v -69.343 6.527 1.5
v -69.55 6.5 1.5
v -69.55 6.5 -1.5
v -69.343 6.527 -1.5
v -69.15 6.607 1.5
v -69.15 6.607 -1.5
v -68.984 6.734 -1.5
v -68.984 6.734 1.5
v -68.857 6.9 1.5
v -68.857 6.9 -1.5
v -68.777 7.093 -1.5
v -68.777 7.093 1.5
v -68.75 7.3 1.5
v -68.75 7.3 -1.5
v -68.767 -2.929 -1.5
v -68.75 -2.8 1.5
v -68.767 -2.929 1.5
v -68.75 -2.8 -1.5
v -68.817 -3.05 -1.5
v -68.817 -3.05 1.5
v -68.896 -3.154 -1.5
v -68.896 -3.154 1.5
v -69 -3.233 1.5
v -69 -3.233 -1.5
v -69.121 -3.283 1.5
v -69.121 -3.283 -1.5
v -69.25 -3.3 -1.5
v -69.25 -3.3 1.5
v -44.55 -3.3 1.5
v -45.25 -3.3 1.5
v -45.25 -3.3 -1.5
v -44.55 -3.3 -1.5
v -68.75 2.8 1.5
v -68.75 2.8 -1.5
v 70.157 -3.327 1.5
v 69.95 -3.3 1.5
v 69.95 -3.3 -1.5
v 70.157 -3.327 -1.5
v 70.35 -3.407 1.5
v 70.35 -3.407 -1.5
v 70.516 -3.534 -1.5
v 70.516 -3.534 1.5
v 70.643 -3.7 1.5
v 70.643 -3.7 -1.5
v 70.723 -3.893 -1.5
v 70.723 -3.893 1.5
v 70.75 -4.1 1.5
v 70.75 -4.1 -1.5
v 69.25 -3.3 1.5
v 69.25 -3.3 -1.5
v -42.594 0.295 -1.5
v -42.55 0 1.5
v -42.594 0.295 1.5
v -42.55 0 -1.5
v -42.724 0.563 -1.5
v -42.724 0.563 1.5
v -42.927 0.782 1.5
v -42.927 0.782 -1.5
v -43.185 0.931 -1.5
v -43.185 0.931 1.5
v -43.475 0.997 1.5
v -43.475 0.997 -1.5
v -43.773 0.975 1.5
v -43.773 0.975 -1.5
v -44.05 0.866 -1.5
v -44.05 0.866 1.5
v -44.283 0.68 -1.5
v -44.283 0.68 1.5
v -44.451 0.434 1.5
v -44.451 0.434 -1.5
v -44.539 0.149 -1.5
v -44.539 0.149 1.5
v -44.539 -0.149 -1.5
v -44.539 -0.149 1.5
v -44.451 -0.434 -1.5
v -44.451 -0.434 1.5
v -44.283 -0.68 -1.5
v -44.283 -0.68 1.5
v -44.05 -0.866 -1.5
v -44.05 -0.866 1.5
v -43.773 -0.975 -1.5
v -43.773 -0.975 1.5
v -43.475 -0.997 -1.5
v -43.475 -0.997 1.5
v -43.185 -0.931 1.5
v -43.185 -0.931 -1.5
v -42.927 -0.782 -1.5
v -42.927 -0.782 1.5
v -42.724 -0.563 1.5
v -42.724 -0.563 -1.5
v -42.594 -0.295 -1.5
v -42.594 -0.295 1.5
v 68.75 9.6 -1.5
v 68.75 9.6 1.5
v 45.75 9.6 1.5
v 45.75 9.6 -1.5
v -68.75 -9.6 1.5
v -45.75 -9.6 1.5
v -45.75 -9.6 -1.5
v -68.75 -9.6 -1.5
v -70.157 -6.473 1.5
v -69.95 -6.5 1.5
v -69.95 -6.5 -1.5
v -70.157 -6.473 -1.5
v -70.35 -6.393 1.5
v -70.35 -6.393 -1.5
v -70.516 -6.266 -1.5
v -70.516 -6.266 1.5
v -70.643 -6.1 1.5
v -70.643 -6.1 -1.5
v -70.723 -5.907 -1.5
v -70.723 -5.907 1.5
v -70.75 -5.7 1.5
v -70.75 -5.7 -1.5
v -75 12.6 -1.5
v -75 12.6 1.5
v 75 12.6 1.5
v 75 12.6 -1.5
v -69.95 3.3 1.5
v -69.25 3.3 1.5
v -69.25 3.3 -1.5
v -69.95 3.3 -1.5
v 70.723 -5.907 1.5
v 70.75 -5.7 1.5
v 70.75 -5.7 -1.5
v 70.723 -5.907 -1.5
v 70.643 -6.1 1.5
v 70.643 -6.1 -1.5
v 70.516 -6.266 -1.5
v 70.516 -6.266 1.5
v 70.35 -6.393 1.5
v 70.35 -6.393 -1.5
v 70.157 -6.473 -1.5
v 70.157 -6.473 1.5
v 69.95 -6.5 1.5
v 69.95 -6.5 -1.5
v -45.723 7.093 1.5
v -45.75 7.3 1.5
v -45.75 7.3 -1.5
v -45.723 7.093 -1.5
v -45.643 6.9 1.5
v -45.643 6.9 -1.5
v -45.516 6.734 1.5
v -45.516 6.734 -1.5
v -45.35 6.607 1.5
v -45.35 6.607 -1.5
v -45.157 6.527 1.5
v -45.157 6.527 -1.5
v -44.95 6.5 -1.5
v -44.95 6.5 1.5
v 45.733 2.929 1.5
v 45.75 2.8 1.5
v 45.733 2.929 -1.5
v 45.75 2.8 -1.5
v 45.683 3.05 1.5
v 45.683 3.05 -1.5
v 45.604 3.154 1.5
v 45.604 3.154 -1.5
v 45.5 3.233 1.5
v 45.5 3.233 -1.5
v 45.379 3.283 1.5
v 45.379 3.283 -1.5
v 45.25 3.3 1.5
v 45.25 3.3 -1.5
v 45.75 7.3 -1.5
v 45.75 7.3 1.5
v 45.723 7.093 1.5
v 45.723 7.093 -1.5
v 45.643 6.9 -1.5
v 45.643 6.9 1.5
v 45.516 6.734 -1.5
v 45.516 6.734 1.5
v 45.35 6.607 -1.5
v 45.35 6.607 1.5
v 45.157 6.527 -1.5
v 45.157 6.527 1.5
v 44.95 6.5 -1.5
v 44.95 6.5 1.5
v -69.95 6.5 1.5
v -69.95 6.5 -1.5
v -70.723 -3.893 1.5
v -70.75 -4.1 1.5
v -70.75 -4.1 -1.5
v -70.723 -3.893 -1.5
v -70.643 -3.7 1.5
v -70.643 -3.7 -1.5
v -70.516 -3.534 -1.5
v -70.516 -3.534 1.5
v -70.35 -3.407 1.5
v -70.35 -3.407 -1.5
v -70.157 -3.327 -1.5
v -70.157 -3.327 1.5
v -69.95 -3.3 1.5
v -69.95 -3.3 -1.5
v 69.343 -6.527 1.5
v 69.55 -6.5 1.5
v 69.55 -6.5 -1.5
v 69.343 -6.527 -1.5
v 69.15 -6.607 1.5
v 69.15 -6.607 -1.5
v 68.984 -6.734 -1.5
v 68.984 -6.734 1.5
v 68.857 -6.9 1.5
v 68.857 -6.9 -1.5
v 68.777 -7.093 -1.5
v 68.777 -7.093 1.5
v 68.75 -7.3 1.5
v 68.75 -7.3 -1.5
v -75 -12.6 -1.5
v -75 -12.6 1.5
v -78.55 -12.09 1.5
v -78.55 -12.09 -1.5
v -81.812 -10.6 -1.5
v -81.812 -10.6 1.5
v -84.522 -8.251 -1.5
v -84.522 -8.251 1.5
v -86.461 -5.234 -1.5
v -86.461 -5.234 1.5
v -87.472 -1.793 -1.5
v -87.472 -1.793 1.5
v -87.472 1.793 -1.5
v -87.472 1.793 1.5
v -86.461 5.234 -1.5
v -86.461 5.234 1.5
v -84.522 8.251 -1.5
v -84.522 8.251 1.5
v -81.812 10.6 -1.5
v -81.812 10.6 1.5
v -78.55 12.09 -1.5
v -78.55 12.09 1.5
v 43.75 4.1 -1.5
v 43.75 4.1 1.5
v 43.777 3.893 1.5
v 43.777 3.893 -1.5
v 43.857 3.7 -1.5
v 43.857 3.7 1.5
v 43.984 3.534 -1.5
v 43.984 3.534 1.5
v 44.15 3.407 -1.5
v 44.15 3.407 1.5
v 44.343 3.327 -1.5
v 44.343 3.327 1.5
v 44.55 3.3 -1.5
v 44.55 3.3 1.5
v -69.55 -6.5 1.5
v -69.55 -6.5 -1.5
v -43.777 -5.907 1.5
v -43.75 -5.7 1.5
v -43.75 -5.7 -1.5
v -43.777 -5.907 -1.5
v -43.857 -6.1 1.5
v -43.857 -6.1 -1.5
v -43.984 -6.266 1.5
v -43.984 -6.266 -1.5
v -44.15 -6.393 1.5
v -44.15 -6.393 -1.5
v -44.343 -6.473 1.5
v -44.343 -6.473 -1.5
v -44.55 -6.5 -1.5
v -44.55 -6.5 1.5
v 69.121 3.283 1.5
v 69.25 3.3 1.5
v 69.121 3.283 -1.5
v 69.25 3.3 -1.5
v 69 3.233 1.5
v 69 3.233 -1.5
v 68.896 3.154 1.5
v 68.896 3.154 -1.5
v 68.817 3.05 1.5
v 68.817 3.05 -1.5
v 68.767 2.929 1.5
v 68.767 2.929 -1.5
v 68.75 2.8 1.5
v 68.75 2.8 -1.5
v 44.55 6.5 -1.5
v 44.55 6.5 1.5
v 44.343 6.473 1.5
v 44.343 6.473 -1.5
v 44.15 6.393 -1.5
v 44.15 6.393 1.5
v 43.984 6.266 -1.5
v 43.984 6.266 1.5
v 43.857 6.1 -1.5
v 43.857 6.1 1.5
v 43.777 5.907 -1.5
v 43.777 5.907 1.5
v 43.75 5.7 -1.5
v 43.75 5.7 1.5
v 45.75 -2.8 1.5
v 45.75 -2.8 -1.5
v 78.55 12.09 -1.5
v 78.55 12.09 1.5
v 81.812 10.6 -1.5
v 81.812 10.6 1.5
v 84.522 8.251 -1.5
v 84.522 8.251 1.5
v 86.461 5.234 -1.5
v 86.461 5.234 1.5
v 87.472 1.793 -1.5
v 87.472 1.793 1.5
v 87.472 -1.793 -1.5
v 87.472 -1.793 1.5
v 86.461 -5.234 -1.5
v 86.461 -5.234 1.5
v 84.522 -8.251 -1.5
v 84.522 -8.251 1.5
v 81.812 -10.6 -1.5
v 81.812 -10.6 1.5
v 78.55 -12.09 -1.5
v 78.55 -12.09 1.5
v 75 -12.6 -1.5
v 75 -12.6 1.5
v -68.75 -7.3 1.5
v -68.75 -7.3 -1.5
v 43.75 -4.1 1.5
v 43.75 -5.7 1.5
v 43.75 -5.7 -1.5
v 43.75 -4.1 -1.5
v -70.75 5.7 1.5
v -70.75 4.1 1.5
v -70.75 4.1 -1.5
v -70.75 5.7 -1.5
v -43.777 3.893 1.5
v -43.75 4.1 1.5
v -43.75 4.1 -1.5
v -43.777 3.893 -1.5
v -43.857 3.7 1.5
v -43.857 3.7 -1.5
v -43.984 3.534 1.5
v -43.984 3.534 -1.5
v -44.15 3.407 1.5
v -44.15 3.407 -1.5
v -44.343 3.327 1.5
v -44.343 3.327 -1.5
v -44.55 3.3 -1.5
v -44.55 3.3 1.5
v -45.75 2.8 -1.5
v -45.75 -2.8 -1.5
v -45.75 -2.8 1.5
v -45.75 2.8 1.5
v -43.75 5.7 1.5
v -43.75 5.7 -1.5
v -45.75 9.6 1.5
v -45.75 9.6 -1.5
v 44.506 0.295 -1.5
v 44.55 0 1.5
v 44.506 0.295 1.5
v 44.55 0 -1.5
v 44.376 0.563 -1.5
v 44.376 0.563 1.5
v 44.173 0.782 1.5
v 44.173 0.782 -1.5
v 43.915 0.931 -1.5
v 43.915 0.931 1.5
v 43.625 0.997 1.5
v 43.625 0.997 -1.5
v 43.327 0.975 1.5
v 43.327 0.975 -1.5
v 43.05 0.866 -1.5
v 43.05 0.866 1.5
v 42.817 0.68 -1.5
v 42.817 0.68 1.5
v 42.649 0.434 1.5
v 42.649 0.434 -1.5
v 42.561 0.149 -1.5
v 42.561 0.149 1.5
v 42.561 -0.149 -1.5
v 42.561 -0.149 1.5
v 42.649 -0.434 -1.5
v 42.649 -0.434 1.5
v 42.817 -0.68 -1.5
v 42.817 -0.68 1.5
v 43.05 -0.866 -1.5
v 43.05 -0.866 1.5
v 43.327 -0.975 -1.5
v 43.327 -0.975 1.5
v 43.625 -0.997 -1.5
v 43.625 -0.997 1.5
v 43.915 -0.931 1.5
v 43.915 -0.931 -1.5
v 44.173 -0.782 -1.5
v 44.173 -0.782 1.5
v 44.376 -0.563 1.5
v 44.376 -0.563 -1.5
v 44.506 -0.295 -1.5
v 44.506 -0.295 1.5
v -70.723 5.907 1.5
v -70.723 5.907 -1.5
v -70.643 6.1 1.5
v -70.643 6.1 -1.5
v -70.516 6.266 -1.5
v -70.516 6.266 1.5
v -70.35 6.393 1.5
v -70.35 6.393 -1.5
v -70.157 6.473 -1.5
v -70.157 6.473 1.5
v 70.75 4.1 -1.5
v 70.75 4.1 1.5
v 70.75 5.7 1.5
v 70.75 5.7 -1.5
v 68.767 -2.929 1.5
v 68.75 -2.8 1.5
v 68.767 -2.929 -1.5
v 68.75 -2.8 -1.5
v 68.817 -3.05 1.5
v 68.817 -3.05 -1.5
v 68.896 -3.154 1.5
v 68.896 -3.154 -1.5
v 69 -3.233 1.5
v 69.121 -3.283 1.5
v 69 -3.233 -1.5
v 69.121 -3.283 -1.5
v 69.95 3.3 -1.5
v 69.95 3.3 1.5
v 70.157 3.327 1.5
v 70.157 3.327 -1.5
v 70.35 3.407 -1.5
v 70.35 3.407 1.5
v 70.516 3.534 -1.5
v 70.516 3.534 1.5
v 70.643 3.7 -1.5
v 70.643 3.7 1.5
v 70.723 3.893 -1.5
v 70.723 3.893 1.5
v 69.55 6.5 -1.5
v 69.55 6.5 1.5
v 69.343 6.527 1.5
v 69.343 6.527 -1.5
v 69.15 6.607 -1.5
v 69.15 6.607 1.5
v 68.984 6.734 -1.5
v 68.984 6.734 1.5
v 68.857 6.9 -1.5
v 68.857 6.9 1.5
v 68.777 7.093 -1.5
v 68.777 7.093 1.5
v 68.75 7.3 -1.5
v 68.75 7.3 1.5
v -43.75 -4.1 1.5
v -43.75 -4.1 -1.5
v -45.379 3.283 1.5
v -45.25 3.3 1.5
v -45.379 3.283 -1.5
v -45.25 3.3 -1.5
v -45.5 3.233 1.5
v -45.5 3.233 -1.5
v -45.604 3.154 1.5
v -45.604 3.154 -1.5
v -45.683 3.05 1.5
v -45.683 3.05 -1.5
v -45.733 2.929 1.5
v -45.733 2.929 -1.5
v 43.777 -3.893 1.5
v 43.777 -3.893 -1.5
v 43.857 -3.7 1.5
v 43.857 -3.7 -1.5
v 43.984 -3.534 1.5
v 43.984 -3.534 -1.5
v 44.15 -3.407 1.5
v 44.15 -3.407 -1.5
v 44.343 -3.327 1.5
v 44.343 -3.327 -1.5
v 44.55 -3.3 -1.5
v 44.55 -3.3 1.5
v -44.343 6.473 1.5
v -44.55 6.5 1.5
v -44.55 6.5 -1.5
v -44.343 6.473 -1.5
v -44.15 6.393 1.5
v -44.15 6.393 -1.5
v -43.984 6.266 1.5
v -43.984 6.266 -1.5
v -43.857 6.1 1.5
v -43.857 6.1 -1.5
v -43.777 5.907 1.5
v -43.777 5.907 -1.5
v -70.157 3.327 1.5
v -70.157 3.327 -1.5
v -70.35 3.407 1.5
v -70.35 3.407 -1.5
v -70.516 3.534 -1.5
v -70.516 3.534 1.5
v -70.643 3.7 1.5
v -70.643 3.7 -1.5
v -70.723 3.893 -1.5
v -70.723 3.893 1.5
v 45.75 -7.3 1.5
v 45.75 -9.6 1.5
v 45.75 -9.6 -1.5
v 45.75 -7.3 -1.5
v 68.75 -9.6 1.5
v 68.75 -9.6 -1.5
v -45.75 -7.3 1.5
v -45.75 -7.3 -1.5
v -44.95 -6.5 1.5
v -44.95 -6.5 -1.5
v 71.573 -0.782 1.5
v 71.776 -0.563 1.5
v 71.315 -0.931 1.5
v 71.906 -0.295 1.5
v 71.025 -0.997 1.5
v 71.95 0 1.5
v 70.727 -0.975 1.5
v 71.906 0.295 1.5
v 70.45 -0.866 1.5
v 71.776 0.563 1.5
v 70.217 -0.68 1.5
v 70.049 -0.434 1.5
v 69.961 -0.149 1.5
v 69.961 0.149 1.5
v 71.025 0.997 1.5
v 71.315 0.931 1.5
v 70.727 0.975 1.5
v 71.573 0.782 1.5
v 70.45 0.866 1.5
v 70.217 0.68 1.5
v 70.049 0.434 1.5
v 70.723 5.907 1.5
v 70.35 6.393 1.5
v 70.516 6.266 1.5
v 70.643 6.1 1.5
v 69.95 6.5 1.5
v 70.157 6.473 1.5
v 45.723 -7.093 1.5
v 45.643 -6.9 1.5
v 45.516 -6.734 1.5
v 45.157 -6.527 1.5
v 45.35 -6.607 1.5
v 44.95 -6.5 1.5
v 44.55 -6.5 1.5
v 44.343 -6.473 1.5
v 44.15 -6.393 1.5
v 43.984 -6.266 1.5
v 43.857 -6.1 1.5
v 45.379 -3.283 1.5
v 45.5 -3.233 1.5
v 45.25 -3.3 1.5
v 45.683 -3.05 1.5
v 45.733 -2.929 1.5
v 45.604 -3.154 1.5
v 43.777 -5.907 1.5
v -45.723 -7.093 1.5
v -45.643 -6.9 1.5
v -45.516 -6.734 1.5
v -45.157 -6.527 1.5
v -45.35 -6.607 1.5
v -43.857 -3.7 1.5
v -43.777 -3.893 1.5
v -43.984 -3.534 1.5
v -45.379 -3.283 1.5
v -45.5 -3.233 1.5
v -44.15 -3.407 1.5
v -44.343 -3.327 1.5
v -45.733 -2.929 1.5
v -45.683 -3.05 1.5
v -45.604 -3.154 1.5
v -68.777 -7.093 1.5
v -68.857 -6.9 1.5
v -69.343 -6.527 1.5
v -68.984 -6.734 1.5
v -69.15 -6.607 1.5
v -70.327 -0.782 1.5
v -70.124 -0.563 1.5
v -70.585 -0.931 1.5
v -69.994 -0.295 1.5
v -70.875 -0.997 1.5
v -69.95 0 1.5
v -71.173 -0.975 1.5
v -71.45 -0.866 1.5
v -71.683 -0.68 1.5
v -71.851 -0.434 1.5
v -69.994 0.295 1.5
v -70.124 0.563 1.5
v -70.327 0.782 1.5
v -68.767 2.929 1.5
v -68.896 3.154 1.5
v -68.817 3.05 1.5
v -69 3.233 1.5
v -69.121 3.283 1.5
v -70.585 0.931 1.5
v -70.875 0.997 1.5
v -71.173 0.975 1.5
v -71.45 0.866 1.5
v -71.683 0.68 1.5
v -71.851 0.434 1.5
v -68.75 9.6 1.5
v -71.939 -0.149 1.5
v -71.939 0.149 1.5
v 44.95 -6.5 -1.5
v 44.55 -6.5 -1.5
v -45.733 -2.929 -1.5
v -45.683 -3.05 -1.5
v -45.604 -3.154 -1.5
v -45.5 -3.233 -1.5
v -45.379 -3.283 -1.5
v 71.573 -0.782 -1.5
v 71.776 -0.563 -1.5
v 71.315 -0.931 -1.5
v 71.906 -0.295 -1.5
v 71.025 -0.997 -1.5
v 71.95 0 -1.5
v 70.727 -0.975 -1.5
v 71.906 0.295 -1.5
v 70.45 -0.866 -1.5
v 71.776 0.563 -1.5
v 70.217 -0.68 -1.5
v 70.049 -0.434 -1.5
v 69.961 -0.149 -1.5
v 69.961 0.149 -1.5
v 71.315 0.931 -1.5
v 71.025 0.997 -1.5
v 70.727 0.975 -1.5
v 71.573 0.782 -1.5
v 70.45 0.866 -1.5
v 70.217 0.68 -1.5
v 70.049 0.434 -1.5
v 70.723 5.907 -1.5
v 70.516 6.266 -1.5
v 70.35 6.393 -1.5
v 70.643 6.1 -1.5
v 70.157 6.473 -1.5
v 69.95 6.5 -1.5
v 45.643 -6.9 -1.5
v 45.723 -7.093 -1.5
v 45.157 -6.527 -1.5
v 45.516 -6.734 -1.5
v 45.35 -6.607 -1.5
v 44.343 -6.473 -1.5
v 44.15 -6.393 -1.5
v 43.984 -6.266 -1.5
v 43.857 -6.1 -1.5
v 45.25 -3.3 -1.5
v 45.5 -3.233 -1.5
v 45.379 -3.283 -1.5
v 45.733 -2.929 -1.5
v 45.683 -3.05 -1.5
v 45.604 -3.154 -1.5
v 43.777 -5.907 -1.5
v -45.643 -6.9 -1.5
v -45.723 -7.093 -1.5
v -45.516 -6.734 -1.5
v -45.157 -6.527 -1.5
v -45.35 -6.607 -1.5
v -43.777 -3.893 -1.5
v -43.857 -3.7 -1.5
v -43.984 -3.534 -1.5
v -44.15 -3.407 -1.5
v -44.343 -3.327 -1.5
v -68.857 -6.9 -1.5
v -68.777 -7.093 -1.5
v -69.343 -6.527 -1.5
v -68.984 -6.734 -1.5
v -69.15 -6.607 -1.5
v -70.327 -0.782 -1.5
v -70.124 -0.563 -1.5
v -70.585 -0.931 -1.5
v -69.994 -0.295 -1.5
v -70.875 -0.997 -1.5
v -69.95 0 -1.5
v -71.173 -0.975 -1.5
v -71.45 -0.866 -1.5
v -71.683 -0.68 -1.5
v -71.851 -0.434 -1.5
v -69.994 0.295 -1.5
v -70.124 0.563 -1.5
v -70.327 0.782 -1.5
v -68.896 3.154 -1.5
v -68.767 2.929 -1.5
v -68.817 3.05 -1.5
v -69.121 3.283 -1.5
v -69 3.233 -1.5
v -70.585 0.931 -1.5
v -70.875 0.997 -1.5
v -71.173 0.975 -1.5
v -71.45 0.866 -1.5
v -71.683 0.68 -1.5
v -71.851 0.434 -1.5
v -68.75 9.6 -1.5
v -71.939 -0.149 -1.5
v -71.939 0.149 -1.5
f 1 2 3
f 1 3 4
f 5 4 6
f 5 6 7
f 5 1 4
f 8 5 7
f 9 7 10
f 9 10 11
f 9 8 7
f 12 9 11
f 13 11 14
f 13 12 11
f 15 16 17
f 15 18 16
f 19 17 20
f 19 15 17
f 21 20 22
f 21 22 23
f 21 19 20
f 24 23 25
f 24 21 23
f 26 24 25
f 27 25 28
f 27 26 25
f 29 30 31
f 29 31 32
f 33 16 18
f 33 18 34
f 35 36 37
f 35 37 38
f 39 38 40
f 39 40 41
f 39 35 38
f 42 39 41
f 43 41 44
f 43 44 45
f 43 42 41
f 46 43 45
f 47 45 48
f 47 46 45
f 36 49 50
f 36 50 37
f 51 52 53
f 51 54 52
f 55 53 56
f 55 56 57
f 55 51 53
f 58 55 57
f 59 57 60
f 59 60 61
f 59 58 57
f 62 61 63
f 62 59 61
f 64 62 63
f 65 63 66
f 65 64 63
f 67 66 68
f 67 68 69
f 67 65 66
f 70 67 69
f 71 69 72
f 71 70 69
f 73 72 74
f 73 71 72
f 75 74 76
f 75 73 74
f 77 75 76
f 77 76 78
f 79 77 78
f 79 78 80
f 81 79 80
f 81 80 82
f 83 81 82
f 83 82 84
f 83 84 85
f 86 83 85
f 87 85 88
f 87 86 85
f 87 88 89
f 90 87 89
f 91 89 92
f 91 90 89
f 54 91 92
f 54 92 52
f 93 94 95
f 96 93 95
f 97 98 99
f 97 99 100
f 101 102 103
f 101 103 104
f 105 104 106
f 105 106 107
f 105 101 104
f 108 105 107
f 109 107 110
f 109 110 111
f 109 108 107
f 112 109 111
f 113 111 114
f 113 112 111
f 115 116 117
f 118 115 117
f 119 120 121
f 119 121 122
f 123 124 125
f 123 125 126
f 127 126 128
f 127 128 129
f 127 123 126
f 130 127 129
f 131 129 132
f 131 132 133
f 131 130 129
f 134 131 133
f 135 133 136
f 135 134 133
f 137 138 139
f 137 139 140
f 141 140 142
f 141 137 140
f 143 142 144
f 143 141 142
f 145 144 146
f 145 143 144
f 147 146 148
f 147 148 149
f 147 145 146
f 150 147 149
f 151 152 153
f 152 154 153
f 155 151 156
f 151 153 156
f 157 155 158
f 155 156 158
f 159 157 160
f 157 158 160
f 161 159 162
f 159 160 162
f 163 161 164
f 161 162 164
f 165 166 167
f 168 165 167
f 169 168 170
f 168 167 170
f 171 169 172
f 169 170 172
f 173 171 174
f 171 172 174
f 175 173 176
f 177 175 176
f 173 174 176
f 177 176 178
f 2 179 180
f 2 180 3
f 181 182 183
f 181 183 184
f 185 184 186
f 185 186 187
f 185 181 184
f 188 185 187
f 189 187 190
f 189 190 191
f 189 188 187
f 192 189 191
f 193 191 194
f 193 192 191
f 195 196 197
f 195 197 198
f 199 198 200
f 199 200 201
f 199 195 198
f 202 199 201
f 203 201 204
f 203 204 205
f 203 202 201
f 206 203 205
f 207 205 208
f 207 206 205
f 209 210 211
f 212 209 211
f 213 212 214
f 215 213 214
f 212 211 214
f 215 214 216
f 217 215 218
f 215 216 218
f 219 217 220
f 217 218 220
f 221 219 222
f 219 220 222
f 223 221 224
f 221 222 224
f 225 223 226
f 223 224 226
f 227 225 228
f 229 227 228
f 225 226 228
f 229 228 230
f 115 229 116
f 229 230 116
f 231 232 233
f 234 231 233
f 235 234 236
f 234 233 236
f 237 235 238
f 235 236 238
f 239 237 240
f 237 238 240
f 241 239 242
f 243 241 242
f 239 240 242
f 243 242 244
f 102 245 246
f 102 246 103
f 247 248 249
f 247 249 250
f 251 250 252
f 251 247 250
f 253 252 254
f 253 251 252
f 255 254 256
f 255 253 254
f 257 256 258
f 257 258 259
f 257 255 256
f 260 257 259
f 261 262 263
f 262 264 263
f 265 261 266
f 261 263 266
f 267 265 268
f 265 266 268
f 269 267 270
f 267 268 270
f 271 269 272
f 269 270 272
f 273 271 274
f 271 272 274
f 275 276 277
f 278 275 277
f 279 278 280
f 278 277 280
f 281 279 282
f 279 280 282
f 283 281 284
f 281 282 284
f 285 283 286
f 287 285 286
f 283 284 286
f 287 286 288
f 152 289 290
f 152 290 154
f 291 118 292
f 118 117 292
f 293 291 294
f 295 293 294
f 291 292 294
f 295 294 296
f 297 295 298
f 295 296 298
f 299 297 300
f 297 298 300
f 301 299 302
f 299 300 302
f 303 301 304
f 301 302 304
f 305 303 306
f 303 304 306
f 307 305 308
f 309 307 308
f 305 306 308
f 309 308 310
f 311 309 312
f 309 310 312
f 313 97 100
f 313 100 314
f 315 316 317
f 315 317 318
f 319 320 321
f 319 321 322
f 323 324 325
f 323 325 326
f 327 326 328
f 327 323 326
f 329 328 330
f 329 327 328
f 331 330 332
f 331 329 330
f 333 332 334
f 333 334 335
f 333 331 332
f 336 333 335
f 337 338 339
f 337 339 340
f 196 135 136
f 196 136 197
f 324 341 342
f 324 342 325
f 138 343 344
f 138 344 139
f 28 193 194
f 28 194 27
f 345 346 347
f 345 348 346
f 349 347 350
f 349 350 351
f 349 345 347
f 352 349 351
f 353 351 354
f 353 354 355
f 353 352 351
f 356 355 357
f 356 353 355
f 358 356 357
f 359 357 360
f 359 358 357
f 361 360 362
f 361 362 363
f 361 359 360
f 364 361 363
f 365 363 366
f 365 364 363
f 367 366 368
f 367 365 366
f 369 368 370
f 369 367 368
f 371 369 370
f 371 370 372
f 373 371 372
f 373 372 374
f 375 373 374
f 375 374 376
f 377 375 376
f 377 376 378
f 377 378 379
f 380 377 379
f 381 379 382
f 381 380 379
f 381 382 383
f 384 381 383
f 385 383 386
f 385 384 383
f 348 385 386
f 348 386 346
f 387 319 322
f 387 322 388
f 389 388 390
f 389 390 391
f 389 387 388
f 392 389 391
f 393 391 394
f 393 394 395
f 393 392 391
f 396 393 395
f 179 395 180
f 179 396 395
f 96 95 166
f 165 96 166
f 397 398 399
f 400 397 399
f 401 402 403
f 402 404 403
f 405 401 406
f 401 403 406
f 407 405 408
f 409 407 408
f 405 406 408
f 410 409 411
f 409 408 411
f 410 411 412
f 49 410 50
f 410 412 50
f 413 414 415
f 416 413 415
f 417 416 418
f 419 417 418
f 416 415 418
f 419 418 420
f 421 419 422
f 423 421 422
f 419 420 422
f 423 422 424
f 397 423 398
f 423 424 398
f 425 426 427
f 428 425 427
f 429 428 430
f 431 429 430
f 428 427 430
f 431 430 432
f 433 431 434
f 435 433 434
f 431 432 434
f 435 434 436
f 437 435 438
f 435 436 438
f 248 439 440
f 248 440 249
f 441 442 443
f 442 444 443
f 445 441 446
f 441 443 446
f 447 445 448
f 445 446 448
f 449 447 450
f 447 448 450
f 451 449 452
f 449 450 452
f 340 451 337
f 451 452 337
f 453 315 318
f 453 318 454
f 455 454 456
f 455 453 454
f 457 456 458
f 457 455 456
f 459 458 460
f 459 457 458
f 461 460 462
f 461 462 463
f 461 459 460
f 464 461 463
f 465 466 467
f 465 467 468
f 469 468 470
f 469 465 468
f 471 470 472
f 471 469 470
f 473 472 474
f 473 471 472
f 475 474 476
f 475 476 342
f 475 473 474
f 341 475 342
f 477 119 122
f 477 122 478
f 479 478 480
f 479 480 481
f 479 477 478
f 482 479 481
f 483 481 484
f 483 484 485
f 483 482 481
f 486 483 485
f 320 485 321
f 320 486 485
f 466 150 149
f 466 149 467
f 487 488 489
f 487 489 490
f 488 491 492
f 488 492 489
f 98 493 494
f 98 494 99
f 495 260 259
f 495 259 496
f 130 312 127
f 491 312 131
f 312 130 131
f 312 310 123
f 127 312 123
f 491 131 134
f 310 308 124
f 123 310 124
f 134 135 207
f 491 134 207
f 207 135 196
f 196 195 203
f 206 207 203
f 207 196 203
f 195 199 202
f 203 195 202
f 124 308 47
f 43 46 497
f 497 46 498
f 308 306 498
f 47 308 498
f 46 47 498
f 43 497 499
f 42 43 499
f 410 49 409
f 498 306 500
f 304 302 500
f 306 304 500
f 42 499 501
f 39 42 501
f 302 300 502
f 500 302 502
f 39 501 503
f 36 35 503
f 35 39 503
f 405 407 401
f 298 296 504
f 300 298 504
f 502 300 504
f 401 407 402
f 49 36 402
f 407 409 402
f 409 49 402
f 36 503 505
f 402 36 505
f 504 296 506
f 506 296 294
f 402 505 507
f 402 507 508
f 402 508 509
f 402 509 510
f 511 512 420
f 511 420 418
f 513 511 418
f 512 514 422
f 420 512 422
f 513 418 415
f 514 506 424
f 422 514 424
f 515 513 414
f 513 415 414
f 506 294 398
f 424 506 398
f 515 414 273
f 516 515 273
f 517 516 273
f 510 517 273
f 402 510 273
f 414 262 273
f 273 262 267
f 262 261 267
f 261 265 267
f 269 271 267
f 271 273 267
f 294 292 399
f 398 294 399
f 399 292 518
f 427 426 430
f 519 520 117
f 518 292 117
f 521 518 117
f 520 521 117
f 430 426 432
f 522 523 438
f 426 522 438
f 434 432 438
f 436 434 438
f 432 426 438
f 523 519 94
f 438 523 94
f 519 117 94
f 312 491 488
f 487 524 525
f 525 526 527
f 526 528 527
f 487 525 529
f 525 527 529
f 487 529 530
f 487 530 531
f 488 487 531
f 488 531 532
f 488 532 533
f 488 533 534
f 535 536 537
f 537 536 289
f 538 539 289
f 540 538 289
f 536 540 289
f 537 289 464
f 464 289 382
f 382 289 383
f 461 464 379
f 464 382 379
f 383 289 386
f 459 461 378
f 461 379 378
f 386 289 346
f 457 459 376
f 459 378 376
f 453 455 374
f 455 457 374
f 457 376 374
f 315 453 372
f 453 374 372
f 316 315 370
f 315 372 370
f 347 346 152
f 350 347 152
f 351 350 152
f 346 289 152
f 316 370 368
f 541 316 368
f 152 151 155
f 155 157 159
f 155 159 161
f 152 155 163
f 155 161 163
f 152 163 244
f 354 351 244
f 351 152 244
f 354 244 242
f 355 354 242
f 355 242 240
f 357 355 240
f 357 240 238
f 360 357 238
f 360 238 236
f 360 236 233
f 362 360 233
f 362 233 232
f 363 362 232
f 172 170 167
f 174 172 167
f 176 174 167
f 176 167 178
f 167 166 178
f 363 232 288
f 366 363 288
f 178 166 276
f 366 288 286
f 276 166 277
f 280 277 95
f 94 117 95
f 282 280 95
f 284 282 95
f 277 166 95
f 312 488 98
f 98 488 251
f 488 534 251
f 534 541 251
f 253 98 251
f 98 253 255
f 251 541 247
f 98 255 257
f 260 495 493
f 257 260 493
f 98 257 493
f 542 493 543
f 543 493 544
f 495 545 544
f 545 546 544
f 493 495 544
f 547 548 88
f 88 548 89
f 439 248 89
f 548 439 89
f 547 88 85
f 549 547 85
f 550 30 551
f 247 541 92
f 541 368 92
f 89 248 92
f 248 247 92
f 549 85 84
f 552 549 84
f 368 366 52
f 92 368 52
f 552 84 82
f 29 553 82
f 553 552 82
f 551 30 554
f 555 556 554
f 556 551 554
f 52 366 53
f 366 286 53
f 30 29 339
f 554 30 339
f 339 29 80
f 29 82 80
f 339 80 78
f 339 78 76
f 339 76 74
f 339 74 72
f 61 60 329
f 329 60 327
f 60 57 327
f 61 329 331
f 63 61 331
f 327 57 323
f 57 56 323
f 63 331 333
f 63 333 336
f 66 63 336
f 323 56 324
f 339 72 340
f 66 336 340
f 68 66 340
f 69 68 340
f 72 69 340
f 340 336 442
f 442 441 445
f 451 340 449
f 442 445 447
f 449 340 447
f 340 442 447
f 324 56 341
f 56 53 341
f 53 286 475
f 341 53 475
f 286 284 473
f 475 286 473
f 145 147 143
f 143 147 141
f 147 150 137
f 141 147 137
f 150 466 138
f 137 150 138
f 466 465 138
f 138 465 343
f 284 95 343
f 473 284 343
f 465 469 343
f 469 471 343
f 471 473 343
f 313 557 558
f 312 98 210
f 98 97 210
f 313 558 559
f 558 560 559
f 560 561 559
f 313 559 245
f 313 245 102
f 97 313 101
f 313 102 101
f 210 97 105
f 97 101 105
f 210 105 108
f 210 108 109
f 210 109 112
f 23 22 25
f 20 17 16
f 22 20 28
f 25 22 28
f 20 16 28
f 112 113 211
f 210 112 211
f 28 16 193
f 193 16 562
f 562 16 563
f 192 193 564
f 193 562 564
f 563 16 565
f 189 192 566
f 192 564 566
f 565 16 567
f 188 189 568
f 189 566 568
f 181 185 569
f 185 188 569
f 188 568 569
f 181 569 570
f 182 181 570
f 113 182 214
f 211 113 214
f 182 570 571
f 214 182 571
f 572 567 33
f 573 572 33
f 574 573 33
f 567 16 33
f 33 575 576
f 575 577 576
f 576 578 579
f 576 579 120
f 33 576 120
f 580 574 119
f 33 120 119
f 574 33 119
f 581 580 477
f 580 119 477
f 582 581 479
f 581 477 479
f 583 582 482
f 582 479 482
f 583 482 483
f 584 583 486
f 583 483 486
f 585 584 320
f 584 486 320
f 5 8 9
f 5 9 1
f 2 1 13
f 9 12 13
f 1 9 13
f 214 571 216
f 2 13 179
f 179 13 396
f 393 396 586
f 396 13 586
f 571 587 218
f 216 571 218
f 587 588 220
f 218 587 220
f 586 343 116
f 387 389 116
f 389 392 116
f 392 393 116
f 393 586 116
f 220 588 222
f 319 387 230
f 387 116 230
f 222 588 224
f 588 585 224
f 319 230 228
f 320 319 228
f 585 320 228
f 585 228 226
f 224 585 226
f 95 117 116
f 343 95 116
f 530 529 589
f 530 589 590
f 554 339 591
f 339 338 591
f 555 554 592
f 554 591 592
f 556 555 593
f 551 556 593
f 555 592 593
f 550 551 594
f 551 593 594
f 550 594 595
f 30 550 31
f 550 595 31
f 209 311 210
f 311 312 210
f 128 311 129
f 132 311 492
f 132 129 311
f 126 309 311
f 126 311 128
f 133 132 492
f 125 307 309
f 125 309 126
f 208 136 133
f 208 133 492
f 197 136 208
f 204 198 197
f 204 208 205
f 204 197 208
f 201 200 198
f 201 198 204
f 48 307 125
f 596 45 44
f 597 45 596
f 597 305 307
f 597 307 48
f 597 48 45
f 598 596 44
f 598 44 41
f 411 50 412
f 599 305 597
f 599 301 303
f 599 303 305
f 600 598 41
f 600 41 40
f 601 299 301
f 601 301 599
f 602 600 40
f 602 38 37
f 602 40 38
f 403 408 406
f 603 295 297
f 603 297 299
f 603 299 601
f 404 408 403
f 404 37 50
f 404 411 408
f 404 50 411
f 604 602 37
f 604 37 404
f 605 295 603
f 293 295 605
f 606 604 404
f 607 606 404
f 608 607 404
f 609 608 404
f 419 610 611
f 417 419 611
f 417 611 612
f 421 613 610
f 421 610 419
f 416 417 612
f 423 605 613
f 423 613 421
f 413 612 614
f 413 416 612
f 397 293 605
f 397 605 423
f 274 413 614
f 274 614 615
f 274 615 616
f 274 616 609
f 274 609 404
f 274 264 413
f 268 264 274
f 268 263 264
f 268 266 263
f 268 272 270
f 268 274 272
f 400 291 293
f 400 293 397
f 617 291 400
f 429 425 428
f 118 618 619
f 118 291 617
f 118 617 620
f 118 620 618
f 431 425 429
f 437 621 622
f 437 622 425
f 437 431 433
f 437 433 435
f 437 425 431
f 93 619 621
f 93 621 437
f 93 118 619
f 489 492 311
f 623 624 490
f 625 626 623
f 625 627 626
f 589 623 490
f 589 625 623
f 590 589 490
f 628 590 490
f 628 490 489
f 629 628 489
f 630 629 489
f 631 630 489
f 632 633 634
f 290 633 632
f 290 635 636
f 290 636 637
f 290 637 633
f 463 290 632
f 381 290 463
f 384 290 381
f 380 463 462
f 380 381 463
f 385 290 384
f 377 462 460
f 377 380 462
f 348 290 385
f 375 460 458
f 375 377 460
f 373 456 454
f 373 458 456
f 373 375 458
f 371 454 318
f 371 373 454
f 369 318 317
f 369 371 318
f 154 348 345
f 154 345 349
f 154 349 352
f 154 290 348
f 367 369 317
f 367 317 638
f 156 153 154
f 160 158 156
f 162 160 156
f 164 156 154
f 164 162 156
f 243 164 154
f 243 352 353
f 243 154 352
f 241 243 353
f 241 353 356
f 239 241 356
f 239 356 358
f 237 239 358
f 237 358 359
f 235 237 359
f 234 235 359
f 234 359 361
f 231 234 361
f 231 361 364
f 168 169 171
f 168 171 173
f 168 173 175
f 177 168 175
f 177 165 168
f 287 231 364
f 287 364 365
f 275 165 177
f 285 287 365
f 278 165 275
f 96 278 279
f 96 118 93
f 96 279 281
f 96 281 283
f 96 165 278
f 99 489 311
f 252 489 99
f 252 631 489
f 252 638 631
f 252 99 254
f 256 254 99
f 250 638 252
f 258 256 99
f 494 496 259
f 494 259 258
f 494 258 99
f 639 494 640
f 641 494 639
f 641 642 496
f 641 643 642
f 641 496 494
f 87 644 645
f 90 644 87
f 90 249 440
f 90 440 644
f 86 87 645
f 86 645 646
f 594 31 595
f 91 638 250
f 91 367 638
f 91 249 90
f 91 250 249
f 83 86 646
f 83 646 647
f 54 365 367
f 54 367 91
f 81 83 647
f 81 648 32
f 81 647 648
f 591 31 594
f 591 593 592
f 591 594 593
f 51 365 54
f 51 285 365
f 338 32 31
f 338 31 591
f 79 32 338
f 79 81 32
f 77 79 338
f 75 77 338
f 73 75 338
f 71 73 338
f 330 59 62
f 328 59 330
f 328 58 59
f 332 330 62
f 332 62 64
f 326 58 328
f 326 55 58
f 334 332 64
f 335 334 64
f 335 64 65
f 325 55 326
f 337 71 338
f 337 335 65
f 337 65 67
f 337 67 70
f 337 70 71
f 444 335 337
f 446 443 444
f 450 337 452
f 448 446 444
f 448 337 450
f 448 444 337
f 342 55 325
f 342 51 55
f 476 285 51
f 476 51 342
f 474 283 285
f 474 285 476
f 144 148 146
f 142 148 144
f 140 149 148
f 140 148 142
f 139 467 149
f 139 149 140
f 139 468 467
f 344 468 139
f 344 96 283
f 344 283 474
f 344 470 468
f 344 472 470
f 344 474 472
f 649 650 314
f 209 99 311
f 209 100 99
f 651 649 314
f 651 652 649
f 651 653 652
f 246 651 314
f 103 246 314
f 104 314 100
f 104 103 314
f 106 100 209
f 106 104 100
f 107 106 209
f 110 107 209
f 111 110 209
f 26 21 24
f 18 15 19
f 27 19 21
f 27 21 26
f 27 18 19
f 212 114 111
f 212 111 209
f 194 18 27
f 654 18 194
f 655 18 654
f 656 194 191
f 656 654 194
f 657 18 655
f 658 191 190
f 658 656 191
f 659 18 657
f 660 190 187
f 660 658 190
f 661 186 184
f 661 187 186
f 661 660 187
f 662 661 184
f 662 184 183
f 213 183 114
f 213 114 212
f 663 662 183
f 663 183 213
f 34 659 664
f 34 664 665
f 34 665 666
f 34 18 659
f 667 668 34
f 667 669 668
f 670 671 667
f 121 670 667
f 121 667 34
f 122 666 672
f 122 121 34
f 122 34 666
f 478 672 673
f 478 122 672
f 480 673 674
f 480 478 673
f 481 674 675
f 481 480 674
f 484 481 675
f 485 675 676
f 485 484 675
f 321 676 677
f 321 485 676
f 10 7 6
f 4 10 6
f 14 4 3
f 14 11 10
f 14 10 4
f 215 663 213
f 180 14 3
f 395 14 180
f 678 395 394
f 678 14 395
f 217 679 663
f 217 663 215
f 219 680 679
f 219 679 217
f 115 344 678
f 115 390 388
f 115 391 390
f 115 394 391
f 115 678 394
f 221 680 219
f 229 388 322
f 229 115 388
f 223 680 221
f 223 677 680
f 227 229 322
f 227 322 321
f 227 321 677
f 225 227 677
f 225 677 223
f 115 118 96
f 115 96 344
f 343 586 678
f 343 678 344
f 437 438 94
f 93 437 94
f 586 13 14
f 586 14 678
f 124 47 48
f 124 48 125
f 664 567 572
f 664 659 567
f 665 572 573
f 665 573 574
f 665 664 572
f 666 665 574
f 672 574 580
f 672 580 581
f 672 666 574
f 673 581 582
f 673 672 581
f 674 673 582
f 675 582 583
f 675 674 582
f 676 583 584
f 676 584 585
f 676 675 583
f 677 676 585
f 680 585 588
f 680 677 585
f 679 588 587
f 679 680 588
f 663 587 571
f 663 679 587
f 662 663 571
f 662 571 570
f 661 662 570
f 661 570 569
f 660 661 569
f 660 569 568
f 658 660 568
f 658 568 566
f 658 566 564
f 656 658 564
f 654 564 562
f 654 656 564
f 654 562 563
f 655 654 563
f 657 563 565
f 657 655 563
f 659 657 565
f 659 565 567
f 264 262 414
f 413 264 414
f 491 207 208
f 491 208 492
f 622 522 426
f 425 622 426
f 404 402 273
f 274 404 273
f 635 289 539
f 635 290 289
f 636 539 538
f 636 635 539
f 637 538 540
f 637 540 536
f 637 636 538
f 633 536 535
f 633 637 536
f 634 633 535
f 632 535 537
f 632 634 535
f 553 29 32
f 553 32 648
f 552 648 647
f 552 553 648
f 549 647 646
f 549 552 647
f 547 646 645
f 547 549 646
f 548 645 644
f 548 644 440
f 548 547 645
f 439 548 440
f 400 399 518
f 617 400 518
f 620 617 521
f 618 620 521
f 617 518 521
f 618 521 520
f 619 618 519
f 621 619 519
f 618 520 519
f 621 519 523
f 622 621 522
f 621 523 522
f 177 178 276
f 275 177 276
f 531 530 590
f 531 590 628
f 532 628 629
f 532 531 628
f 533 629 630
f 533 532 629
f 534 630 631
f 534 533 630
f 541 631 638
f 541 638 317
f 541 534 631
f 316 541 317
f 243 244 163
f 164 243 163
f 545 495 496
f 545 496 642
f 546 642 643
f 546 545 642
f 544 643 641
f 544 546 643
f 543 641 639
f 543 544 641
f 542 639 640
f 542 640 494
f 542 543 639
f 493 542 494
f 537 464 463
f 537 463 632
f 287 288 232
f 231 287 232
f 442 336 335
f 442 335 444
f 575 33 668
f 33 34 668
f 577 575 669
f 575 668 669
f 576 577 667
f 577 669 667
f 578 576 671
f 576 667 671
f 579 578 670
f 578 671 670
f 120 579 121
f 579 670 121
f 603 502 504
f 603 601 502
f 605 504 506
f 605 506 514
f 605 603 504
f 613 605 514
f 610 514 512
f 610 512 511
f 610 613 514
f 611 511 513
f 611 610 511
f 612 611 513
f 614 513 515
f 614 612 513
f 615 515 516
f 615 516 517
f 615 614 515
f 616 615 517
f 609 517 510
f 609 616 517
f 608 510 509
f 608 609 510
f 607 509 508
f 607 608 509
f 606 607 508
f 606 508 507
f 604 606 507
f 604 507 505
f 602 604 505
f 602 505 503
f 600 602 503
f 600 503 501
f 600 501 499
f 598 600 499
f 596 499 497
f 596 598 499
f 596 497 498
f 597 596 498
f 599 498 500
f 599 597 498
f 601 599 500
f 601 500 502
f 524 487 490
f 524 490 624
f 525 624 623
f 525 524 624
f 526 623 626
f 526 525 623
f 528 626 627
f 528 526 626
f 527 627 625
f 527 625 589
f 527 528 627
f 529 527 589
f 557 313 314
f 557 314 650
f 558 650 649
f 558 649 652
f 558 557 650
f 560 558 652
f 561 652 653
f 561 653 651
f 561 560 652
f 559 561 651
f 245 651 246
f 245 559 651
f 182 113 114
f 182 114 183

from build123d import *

# Parameters (mm, degrees)
SKETCH_1_R          = 1
SKETCH_1_W          = 23
SKETCH_1_H          = 13
EXTRUDE_1_DEPTH     = 1.5
CUT_EXTRUDE_1_DEPTH = 3
FILLET_1_R          = 0.5


with BuildPart() as part:
    # 草图1 → 凸台-拉伸1 (new body, symmetric)
    with BuildSketch(Plane.XY):
        with BuildLine():
            Line((-75, 12.6), (75, 12.6))
            ThreePointArc((75, 12.6), (87.6, 0), (75, -12.6))
            Line((75, -12.6), (-75, -12.6))
            ThreePointArc((-75, -12.6), (-87.6, 0), (-75, 12.6))
        make_face()
        with Locations((-43.55, 0)):
            Circle(SKETCH_1_R, mode=Mode.SUBTRACT)
        with Locations((-70.95, 0)):
            Circle(SKETCH_1_R, mode=Mode.SUBTRACT)
        with Locations((70.95, 0)):
            Circle(SKETCH_1_R, mode=Mode.SUBTRACT)
        with Locations((43.55, 0)):
            Circle(SKETCH_1_R, mode=Mode.SUBTRACT)
        with Locations((-57.25, 0)):
            Rectangle(SKETCH_1_W, SKETCH_1_H, mode=Mode.SUBTRACT)
        with Locations((57.25, 0)):
            Rectangle(SKETCH_1_W, SKETCH_1_H, mode=Mode.SUBTRACT)
    extrude(amount=EXTRUDE_1_DEPTH, both=True)

    # 草图2 → 切除-拉伸1 (cut)
    with BuildSketch(Plane.XY.offset(1.5)):
        with BuildLine():
            Line((44.95, 6.5), (44.55, 6.5))
            ThreePointArc((44.55, 6.5), (43.984314575, 6.265685425), (43.75, 5.7))
            Line((43.75, 5.7), (43.75, 4.1))
            ThreePointArc((43.75, 4.1), (43.984314575, 3.534314575), (44.55, 3.3))
            Line((44.55, 3.3), (45.75, 3.3))
            Line((45.75, 3.3), (45.75, 6.5))
            Line((45.75, 6.5), (68.75, 6.5))
            Line((68.75, 6.5), (68.75, 3.3))
            Line((68.75, 3.3), (69.95, 3.3))
            ThreePointArc((69.95, 3.3), (70.515685425, 3.534314575), (70.75, 4.1))
            Line((70.75, 4.1), (70.75, 5.7))
            ThreePointArc((70.75, 5.7), (70.515685425, 6.265685425), (69.95, 6.5))
            Line((69.95, 6.5), (69.55, 6.5))
            ThreePointArc((69.55, 6.5), (68.984314575, 6.734314575), (68.75, 7.3))
            Line((68.75, 7.3), (68.75, 9.6))
            Line((68.75, 9.6), (45.75, 9.6))
            Line((45.75, 9.6), (45.75, 7.3))
            ThreePointArc((45.75, 7.3), (45.515685425, 6.734314575), (44.95, 6.5))
        make_face()
        with BuildLine():
            Line((44.55, -3.3), (45.75, -3.3))
            Line((45.75, -3.3), (45.75, -6.5))
            Line((45.75, -6.5), (68.75, -6.5))
            Line((68.75, -6.5), (68.75, -3.3))
            Line((68.75, -3.3), (69.95, -3.3))
            ThreePointArc((69.95, -3.3), (70.515685425, -3.534314575), (70.75, -4.1))
            Line((70.75, -4.1), (70.75, -5.7))
            ThreePointArc((70.75, -5.7), (70.515685425, -6.265685425), (69.95, -6.5))
            Line((69.95, -6.5), (69.55, -6.5))
            ThreePointArc((69.55, -6.5), (68.984314575, -6.734314575), (68.75, -7.3))
            Line((68.75, -7.3), (68.75, -9.6))
            Line((68.75, -9.6), (45.75, -9.6))
            Line((45.75, -9.6), (45.75, -7.3))
            ThreePointArc((45.75, -7.3), (45.515685425, -6.734314575), (44.95, -6.5))
            Line((44.95, -6.5), (44.55, -6.5))
            ThreePointArc((44.55, -6.5), (43.984314575, -6.265685425), (43.75, -5.7))
            Line((43.75, -5.7), (43.75, -4.1))
            ThreePointArc((43.75, -4.1), (43.984314575, -3.534314575), (44.55, -3.3))
        make_face()
        with BuildLine():
            Line((-45.75, 3.3), (-45.75, 6.5))
            Line((-45.75, 6.5), (-68.75, 6.5))
            Line((-68.75, 6.5), (-68.75, 3.3))
            Line((-68.75, 3.3), (-69.95, 3.3))
            ThreePointArc((-69.95, 3.3), (-70.515685425, 3.534314575), (-70.75, 4.1))
            Line((-70.75, 4.1), (-70.75, 5.7))
            ThreePointArc((-70.75, 5.7), (-70.515685425, 6.265685425), (-69.95, 6.5))
            Line((-69.95, 6.5), (-69.55, 6.5))
            ThreePointArc((-69.55, 6.5), (-68.984314575, 6.734314575), (-68.75, 7.3))
            Line((-68.75, 7.3), (-68.75, 9.6))
            Line((-68.75, 9.6), (-45.75, 9.6))
            Line((-45.75, 9.6), (-45.75, 7.3))
            ThreePointArc((-45.75, 7.3), (-45.515685425, 6.734314575), (-44.95, 6.5))
            Line((-44.95, 6.5), (-44.55, 6.5))
            ThreePointArc((-44.55, 6.5), (-43.984314575, 6.265685425), (-43.75, 5.7))
            Line((-43.75, 5.7), (-43.75, 4.1))
            ThreePointArc((-43.75, 4.1), (-43.984314575, 3.534314575), (-44.55, 3.3))
            Line((-44.55, 3.3), (-45.75, 3.3))
        make_face()
        with BuildLine():
            Line((-45.75, -7.3), (-45.75, -9.6))
            Line((-45.75, -9.6), (-68.75, -9.6))
            Line((-68.75, -9.6), (-68.75, -7.3))
            ThreePointArc((-68.75, -7.3), (-68.984314575, -6.734314575), (-69.55, -6.5))
            Line((-69.55, -6.5), (-69.95, -6.5))
            ThreePointArc((-69.95, -6.5), (-70.515685425, -6.265685425), (-70.75, -5.7))
            Line((-70.75, -5.7), (-70.75, -4.1))
            ThreePointArc((-70.75, -4.1), (-70.515685425, -3.534314575), (-69.95, -3.3))
            Line((-69.95, -3.3), (-68.75, -3.3))
            Line((-68.75, -3.3), (-68.75, -6.5))
            Line((-68.75, -6.5), (-45.75, -6.5))
            Line((-45.75, -6.5), (-45.75, -3.3))
            Line((-45.75, -3.3), (-44.55, -3.3))
            ThreePointArc((-44.55, -3.3), (-43.984314575, -3.534314575), (-43.75, -4.1))
            Line((-43.75, -4.1), (-43.75, -5.7))
            ThreePointArc((-43.75, -5.7), (-43.984314575, -6.265685425), (-44.55, -6.5))
            Line((-44.55, -6.5), (-44.95, -6.5))
            ThreePointArc((-44.95, -6.5), (-45.515685425, -6.734314575), (-45.75, -7.3))
        make_face()
    extrude(amount=-CUT_EXTRUDE_1_DEPTH, mode=Mode.SUBTRACT)

    # 圆角1
    fillet_1_edges = [part.edges().sort_by_distance(p)[0] for p in [
        (45.75, -3.3, 0),
        (68.75, -3.3, 0),
        (-45.75, 3.3, 0),
        (-68.75, 3.3, 0),
        (-68.75, -3.3, 0),
        (-45.75, -3.3, 0),
        (45.75, 3.3, 0),
        (68.75, 3.3, 0),
    ]]
    fillet(fillet_1_edges, radius=FILLET_1_R)


solid = part.part
